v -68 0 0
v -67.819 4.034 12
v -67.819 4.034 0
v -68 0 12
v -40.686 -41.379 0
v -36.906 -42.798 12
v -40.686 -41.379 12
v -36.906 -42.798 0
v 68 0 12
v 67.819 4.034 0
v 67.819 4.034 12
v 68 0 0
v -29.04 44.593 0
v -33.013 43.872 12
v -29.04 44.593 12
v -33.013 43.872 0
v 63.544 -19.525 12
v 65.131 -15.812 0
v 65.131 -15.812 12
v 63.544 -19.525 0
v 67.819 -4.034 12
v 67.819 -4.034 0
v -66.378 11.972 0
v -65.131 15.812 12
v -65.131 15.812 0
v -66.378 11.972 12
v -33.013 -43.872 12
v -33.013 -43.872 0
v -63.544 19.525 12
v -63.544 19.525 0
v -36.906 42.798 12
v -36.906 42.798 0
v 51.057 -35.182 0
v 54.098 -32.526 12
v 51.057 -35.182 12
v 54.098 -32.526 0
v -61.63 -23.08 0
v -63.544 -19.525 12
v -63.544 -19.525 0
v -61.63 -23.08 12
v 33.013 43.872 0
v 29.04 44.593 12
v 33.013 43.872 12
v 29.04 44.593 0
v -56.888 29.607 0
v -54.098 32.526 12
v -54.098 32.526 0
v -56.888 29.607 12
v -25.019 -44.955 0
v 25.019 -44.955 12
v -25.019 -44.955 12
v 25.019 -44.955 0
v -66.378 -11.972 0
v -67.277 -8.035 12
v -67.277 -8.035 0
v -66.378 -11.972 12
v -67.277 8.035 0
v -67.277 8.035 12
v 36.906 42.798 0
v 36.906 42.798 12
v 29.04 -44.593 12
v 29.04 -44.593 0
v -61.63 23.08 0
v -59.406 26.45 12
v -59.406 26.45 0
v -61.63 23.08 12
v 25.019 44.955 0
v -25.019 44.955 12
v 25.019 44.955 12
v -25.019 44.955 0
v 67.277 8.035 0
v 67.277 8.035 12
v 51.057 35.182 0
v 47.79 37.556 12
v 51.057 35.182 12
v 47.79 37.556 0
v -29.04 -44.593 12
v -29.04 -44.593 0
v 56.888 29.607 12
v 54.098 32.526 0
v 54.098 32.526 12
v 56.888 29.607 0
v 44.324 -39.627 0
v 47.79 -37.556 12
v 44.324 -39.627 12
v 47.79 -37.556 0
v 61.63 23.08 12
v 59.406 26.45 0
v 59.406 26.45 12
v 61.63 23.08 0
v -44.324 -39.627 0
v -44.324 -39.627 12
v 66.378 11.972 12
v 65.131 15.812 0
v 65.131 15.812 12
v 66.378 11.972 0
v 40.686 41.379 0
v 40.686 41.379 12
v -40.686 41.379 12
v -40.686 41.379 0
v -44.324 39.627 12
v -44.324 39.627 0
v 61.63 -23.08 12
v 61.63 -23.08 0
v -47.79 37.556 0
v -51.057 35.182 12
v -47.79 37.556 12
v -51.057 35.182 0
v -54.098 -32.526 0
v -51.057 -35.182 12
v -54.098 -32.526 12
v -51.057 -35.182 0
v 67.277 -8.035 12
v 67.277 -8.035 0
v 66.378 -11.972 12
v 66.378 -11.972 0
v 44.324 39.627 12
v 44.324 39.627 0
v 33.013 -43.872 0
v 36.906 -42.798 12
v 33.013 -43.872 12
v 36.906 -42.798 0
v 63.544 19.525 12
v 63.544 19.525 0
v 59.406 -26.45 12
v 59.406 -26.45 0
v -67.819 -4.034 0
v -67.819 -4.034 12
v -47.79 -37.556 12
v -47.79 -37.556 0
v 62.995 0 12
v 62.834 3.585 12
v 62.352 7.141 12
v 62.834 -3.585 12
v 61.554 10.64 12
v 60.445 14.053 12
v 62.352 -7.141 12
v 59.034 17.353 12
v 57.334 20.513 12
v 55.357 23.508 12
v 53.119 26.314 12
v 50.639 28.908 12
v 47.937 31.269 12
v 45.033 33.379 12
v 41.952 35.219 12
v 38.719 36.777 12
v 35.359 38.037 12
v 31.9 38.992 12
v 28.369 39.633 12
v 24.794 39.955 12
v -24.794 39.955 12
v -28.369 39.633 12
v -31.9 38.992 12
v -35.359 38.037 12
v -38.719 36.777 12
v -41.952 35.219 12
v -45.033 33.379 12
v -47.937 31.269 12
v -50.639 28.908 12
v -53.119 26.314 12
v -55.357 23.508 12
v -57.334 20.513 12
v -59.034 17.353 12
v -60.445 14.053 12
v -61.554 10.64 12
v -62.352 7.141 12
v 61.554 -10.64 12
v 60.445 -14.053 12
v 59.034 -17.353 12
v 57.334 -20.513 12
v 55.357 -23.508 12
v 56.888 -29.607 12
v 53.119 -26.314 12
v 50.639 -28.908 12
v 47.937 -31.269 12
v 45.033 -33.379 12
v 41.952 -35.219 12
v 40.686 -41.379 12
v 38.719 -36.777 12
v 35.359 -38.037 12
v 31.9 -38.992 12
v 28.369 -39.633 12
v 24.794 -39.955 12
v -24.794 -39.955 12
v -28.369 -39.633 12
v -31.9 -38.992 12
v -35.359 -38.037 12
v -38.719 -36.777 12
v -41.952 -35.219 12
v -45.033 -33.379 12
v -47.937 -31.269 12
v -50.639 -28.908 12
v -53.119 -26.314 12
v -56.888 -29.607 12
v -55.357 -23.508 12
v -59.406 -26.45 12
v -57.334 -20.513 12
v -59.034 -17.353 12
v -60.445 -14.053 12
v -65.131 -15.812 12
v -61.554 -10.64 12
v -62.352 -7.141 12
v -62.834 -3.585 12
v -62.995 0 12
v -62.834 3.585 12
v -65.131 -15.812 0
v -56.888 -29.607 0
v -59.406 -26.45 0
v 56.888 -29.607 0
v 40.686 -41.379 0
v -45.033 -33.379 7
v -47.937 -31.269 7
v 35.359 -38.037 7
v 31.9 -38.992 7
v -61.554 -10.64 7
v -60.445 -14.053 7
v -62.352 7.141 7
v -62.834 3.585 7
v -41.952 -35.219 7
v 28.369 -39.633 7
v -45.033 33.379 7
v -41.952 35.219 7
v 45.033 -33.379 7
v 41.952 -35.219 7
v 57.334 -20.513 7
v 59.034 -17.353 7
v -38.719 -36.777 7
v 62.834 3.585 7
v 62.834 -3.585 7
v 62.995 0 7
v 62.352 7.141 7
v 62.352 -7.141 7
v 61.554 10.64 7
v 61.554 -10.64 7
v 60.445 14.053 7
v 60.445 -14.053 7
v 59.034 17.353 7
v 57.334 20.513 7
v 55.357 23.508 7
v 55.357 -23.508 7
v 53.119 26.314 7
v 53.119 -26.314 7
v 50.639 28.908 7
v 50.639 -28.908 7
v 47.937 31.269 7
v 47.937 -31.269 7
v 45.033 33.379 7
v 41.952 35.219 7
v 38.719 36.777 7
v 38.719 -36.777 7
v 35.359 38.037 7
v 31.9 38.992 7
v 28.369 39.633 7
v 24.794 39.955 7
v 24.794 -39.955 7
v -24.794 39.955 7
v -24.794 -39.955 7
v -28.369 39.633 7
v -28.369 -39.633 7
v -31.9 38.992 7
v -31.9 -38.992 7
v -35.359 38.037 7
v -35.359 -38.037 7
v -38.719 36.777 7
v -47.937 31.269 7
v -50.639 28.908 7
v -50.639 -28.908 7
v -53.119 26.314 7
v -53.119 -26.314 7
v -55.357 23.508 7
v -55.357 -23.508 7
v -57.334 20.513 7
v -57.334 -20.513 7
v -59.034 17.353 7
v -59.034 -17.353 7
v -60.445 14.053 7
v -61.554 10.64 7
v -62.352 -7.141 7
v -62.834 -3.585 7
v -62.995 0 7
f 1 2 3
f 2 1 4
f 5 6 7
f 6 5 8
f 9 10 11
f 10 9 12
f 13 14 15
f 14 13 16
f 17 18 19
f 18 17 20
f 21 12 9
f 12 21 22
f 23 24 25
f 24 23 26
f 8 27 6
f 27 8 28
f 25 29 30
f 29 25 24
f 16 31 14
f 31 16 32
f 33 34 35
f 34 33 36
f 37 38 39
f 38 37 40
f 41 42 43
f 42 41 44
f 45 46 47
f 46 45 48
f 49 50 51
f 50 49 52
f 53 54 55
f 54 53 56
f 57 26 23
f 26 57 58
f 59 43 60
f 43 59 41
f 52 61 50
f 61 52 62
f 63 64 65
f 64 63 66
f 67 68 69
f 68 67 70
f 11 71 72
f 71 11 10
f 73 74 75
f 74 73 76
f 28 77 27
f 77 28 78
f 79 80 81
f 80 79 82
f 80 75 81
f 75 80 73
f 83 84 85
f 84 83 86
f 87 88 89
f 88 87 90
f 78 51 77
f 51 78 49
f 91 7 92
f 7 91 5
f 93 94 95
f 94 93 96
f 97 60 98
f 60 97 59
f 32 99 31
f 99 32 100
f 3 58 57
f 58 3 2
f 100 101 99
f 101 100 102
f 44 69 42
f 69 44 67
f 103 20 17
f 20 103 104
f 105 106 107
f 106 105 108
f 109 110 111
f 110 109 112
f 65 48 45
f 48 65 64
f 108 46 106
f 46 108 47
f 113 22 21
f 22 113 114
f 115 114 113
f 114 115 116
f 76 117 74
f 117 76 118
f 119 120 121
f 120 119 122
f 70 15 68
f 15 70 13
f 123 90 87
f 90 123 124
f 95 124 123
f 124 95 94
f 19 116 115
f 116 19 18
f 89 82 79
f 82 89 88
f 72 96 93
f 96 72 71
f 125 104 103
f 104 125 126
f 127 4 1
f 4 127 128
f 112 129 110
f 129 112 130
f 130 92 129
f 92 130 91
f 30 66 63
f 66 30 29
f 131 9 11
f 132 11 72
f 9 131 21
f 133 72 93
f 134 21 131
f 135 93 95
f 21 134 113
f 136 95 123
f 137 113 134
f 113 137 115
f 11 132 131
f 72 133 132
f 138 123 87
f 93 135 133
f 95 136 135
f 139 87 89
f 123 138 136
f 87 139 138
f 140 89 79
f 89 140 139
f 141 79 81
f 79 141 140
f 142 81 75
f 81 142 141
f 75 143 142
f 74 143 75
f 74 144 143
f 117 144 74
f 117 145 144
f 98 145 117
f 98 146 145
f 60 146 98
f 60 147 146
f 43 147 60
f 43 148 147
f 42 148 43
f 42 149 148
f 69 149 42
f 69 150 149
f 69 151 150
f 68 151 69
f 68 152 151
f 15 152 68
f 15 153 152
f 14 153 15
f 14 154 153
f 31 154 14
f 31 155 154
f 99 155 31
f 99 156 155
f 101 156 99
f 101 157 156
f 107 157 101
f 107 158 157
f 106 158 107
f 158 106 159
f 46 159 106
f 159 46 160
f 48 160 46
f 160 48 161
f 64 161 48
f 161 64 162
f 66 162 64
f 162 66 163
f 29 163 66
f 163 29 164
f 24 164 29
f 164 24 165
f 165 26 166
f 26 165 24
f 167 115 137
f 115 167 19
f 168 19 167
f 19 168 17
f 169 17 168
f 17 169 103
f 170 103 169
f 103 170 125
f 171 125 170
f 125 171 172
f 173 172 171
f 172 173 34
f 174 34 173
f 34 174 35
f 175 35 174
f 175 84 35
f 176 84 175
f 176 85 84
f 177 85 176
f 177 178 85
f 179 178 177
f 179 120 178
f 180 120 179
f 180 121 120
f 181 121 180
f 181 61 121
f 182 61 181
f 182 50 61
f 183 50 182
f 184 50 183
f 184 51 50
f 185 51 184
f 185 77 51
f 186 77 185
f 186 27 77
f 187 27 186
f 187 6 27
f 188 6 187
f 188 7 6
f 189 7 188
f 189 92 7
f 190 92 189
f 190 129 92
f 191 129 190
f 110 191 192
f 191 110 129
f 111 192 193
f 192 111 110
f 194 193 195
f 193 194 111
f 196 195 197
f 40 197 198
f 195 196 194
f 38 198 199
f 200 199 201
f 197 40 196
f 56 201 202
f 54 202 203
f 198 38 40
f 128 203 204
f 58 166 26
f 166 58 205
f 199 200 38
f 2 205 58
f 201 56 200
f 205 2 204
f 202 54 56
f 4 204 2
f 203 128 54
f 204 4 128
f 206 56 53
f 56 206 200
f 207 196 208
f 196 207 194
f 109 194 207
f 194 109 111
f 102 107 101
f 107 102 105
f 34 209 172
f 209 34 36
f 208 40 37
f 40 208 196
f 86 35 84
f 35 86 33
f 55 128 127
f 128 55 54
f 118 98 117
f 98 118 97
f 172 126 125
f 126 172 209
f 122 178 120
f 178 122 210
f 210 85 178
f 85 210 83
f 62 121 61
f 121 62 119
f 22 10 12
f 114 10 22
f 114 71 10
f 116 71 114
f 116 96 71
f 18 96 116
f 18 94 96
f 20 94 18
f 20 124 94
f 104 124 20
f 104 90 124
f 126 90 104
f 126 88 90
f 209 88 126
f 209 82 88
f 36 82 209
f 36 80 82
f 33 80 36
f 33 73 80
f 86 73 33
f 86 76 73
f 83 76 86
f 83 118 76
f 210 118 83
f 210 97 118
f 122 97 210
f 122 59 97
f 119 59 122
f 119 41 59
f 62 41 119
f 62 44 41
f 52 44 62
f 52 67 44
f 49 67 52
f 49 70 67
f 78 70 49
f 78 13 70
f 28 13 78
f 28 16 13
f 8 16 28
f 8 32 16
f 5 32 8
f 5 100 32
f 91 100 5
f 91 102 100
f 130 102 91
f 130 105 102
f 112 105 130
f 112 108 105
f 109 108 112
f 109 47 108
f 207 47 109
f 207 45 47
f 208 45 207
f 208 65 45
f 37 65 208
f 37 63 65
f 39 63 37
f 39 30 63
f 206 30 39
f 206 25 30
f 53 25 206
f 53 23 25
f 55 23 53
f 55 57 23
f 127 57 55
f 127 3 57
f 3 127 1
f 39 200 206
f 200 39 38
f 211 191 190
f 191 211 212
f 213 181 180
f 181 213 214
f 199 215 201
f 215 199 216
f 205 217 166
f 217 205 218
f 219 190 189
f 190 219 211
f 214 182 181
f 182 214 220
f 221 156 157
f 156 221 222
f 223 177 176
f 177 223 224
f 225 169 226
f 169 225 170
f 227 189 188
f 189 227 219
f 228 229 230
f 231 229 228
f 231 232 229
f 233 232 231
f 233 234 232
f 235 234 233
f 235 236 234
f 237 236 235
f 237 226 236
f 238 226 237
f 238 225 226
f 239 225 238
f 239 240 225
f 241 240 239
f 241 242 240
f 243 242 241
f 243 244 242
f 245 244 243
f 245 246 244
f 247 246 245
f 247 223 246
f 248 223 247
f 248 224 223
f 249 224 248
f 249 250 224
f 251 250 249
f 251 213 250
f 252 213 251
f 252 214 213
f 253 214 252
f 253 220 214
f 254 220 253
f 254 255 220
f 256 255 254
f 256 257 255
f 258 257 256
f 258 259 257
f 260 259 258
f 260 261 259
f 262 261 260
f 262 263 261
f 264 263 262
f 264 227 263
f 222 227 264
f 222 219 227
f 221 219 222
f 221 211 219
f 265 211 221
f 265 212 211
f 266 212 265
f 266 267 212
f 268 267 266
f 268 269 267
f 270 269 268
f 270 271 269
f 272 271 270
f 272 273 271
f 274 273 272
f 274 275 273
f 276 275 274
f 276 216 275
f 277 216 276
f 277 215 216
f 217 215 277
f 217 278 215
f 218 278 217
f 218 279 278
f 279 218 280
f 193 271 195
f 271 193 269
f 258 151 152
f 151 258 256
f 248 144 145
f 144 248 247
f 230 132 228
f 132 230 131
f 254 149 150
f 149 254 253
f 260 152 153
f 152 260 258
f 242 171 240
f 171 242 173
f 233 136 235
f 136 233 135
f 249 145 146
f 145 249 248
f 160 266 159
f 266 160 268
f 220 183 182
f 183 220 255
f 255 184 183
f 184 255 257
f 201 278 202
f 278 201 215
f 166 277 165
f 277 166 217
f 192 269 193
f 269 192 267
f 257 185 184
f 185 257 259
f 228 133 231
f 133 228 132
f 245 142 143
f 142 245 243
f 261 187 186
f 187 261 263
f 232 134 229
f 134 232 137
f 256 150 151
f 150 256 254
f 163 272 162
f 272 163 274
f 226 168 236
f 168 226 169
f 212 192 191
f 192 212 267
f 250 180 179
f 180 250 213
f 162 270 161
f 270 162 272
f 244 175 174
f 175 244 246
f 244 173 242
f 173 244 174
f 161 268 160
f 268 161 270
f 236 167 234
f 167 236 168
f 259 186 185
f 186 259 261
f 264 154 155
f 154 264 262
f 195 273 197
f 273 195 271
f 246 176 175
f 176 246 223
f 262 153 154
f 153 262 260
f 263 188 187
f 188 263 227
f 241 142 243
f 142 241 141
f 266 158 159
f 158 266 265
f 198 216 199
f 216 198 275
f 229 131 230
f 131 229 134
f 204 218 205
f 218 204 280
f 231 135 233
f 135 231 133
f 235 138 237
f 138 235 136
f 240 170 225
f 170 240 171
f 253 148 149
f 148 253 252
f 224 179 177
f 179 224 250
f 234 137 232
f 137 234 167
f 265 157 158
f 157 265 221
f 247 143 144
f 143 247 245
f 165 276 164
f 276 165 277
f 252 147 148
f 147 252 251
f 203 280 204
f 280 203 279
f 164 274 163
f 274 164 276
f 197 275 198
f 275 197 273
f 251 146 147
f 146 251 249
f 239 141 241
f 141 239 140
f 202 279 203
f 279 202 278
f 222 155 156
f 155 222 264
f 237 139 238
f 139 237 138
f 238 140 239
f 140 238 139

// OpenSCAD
$fn=70;

ma = 68;
mb = 45;

module piece_2d() {
  hull()
    for (a = [-1, 1])
      scale([a, 1])
        translate([ma-mb, 0])
          circle(r=mb);
}

difference() {
  linear_extrude(12)
    piece_2d();
  translate([0, 0, 7])
    linear_extrude(10)
      offset(-5)
        piece_2d();
}
